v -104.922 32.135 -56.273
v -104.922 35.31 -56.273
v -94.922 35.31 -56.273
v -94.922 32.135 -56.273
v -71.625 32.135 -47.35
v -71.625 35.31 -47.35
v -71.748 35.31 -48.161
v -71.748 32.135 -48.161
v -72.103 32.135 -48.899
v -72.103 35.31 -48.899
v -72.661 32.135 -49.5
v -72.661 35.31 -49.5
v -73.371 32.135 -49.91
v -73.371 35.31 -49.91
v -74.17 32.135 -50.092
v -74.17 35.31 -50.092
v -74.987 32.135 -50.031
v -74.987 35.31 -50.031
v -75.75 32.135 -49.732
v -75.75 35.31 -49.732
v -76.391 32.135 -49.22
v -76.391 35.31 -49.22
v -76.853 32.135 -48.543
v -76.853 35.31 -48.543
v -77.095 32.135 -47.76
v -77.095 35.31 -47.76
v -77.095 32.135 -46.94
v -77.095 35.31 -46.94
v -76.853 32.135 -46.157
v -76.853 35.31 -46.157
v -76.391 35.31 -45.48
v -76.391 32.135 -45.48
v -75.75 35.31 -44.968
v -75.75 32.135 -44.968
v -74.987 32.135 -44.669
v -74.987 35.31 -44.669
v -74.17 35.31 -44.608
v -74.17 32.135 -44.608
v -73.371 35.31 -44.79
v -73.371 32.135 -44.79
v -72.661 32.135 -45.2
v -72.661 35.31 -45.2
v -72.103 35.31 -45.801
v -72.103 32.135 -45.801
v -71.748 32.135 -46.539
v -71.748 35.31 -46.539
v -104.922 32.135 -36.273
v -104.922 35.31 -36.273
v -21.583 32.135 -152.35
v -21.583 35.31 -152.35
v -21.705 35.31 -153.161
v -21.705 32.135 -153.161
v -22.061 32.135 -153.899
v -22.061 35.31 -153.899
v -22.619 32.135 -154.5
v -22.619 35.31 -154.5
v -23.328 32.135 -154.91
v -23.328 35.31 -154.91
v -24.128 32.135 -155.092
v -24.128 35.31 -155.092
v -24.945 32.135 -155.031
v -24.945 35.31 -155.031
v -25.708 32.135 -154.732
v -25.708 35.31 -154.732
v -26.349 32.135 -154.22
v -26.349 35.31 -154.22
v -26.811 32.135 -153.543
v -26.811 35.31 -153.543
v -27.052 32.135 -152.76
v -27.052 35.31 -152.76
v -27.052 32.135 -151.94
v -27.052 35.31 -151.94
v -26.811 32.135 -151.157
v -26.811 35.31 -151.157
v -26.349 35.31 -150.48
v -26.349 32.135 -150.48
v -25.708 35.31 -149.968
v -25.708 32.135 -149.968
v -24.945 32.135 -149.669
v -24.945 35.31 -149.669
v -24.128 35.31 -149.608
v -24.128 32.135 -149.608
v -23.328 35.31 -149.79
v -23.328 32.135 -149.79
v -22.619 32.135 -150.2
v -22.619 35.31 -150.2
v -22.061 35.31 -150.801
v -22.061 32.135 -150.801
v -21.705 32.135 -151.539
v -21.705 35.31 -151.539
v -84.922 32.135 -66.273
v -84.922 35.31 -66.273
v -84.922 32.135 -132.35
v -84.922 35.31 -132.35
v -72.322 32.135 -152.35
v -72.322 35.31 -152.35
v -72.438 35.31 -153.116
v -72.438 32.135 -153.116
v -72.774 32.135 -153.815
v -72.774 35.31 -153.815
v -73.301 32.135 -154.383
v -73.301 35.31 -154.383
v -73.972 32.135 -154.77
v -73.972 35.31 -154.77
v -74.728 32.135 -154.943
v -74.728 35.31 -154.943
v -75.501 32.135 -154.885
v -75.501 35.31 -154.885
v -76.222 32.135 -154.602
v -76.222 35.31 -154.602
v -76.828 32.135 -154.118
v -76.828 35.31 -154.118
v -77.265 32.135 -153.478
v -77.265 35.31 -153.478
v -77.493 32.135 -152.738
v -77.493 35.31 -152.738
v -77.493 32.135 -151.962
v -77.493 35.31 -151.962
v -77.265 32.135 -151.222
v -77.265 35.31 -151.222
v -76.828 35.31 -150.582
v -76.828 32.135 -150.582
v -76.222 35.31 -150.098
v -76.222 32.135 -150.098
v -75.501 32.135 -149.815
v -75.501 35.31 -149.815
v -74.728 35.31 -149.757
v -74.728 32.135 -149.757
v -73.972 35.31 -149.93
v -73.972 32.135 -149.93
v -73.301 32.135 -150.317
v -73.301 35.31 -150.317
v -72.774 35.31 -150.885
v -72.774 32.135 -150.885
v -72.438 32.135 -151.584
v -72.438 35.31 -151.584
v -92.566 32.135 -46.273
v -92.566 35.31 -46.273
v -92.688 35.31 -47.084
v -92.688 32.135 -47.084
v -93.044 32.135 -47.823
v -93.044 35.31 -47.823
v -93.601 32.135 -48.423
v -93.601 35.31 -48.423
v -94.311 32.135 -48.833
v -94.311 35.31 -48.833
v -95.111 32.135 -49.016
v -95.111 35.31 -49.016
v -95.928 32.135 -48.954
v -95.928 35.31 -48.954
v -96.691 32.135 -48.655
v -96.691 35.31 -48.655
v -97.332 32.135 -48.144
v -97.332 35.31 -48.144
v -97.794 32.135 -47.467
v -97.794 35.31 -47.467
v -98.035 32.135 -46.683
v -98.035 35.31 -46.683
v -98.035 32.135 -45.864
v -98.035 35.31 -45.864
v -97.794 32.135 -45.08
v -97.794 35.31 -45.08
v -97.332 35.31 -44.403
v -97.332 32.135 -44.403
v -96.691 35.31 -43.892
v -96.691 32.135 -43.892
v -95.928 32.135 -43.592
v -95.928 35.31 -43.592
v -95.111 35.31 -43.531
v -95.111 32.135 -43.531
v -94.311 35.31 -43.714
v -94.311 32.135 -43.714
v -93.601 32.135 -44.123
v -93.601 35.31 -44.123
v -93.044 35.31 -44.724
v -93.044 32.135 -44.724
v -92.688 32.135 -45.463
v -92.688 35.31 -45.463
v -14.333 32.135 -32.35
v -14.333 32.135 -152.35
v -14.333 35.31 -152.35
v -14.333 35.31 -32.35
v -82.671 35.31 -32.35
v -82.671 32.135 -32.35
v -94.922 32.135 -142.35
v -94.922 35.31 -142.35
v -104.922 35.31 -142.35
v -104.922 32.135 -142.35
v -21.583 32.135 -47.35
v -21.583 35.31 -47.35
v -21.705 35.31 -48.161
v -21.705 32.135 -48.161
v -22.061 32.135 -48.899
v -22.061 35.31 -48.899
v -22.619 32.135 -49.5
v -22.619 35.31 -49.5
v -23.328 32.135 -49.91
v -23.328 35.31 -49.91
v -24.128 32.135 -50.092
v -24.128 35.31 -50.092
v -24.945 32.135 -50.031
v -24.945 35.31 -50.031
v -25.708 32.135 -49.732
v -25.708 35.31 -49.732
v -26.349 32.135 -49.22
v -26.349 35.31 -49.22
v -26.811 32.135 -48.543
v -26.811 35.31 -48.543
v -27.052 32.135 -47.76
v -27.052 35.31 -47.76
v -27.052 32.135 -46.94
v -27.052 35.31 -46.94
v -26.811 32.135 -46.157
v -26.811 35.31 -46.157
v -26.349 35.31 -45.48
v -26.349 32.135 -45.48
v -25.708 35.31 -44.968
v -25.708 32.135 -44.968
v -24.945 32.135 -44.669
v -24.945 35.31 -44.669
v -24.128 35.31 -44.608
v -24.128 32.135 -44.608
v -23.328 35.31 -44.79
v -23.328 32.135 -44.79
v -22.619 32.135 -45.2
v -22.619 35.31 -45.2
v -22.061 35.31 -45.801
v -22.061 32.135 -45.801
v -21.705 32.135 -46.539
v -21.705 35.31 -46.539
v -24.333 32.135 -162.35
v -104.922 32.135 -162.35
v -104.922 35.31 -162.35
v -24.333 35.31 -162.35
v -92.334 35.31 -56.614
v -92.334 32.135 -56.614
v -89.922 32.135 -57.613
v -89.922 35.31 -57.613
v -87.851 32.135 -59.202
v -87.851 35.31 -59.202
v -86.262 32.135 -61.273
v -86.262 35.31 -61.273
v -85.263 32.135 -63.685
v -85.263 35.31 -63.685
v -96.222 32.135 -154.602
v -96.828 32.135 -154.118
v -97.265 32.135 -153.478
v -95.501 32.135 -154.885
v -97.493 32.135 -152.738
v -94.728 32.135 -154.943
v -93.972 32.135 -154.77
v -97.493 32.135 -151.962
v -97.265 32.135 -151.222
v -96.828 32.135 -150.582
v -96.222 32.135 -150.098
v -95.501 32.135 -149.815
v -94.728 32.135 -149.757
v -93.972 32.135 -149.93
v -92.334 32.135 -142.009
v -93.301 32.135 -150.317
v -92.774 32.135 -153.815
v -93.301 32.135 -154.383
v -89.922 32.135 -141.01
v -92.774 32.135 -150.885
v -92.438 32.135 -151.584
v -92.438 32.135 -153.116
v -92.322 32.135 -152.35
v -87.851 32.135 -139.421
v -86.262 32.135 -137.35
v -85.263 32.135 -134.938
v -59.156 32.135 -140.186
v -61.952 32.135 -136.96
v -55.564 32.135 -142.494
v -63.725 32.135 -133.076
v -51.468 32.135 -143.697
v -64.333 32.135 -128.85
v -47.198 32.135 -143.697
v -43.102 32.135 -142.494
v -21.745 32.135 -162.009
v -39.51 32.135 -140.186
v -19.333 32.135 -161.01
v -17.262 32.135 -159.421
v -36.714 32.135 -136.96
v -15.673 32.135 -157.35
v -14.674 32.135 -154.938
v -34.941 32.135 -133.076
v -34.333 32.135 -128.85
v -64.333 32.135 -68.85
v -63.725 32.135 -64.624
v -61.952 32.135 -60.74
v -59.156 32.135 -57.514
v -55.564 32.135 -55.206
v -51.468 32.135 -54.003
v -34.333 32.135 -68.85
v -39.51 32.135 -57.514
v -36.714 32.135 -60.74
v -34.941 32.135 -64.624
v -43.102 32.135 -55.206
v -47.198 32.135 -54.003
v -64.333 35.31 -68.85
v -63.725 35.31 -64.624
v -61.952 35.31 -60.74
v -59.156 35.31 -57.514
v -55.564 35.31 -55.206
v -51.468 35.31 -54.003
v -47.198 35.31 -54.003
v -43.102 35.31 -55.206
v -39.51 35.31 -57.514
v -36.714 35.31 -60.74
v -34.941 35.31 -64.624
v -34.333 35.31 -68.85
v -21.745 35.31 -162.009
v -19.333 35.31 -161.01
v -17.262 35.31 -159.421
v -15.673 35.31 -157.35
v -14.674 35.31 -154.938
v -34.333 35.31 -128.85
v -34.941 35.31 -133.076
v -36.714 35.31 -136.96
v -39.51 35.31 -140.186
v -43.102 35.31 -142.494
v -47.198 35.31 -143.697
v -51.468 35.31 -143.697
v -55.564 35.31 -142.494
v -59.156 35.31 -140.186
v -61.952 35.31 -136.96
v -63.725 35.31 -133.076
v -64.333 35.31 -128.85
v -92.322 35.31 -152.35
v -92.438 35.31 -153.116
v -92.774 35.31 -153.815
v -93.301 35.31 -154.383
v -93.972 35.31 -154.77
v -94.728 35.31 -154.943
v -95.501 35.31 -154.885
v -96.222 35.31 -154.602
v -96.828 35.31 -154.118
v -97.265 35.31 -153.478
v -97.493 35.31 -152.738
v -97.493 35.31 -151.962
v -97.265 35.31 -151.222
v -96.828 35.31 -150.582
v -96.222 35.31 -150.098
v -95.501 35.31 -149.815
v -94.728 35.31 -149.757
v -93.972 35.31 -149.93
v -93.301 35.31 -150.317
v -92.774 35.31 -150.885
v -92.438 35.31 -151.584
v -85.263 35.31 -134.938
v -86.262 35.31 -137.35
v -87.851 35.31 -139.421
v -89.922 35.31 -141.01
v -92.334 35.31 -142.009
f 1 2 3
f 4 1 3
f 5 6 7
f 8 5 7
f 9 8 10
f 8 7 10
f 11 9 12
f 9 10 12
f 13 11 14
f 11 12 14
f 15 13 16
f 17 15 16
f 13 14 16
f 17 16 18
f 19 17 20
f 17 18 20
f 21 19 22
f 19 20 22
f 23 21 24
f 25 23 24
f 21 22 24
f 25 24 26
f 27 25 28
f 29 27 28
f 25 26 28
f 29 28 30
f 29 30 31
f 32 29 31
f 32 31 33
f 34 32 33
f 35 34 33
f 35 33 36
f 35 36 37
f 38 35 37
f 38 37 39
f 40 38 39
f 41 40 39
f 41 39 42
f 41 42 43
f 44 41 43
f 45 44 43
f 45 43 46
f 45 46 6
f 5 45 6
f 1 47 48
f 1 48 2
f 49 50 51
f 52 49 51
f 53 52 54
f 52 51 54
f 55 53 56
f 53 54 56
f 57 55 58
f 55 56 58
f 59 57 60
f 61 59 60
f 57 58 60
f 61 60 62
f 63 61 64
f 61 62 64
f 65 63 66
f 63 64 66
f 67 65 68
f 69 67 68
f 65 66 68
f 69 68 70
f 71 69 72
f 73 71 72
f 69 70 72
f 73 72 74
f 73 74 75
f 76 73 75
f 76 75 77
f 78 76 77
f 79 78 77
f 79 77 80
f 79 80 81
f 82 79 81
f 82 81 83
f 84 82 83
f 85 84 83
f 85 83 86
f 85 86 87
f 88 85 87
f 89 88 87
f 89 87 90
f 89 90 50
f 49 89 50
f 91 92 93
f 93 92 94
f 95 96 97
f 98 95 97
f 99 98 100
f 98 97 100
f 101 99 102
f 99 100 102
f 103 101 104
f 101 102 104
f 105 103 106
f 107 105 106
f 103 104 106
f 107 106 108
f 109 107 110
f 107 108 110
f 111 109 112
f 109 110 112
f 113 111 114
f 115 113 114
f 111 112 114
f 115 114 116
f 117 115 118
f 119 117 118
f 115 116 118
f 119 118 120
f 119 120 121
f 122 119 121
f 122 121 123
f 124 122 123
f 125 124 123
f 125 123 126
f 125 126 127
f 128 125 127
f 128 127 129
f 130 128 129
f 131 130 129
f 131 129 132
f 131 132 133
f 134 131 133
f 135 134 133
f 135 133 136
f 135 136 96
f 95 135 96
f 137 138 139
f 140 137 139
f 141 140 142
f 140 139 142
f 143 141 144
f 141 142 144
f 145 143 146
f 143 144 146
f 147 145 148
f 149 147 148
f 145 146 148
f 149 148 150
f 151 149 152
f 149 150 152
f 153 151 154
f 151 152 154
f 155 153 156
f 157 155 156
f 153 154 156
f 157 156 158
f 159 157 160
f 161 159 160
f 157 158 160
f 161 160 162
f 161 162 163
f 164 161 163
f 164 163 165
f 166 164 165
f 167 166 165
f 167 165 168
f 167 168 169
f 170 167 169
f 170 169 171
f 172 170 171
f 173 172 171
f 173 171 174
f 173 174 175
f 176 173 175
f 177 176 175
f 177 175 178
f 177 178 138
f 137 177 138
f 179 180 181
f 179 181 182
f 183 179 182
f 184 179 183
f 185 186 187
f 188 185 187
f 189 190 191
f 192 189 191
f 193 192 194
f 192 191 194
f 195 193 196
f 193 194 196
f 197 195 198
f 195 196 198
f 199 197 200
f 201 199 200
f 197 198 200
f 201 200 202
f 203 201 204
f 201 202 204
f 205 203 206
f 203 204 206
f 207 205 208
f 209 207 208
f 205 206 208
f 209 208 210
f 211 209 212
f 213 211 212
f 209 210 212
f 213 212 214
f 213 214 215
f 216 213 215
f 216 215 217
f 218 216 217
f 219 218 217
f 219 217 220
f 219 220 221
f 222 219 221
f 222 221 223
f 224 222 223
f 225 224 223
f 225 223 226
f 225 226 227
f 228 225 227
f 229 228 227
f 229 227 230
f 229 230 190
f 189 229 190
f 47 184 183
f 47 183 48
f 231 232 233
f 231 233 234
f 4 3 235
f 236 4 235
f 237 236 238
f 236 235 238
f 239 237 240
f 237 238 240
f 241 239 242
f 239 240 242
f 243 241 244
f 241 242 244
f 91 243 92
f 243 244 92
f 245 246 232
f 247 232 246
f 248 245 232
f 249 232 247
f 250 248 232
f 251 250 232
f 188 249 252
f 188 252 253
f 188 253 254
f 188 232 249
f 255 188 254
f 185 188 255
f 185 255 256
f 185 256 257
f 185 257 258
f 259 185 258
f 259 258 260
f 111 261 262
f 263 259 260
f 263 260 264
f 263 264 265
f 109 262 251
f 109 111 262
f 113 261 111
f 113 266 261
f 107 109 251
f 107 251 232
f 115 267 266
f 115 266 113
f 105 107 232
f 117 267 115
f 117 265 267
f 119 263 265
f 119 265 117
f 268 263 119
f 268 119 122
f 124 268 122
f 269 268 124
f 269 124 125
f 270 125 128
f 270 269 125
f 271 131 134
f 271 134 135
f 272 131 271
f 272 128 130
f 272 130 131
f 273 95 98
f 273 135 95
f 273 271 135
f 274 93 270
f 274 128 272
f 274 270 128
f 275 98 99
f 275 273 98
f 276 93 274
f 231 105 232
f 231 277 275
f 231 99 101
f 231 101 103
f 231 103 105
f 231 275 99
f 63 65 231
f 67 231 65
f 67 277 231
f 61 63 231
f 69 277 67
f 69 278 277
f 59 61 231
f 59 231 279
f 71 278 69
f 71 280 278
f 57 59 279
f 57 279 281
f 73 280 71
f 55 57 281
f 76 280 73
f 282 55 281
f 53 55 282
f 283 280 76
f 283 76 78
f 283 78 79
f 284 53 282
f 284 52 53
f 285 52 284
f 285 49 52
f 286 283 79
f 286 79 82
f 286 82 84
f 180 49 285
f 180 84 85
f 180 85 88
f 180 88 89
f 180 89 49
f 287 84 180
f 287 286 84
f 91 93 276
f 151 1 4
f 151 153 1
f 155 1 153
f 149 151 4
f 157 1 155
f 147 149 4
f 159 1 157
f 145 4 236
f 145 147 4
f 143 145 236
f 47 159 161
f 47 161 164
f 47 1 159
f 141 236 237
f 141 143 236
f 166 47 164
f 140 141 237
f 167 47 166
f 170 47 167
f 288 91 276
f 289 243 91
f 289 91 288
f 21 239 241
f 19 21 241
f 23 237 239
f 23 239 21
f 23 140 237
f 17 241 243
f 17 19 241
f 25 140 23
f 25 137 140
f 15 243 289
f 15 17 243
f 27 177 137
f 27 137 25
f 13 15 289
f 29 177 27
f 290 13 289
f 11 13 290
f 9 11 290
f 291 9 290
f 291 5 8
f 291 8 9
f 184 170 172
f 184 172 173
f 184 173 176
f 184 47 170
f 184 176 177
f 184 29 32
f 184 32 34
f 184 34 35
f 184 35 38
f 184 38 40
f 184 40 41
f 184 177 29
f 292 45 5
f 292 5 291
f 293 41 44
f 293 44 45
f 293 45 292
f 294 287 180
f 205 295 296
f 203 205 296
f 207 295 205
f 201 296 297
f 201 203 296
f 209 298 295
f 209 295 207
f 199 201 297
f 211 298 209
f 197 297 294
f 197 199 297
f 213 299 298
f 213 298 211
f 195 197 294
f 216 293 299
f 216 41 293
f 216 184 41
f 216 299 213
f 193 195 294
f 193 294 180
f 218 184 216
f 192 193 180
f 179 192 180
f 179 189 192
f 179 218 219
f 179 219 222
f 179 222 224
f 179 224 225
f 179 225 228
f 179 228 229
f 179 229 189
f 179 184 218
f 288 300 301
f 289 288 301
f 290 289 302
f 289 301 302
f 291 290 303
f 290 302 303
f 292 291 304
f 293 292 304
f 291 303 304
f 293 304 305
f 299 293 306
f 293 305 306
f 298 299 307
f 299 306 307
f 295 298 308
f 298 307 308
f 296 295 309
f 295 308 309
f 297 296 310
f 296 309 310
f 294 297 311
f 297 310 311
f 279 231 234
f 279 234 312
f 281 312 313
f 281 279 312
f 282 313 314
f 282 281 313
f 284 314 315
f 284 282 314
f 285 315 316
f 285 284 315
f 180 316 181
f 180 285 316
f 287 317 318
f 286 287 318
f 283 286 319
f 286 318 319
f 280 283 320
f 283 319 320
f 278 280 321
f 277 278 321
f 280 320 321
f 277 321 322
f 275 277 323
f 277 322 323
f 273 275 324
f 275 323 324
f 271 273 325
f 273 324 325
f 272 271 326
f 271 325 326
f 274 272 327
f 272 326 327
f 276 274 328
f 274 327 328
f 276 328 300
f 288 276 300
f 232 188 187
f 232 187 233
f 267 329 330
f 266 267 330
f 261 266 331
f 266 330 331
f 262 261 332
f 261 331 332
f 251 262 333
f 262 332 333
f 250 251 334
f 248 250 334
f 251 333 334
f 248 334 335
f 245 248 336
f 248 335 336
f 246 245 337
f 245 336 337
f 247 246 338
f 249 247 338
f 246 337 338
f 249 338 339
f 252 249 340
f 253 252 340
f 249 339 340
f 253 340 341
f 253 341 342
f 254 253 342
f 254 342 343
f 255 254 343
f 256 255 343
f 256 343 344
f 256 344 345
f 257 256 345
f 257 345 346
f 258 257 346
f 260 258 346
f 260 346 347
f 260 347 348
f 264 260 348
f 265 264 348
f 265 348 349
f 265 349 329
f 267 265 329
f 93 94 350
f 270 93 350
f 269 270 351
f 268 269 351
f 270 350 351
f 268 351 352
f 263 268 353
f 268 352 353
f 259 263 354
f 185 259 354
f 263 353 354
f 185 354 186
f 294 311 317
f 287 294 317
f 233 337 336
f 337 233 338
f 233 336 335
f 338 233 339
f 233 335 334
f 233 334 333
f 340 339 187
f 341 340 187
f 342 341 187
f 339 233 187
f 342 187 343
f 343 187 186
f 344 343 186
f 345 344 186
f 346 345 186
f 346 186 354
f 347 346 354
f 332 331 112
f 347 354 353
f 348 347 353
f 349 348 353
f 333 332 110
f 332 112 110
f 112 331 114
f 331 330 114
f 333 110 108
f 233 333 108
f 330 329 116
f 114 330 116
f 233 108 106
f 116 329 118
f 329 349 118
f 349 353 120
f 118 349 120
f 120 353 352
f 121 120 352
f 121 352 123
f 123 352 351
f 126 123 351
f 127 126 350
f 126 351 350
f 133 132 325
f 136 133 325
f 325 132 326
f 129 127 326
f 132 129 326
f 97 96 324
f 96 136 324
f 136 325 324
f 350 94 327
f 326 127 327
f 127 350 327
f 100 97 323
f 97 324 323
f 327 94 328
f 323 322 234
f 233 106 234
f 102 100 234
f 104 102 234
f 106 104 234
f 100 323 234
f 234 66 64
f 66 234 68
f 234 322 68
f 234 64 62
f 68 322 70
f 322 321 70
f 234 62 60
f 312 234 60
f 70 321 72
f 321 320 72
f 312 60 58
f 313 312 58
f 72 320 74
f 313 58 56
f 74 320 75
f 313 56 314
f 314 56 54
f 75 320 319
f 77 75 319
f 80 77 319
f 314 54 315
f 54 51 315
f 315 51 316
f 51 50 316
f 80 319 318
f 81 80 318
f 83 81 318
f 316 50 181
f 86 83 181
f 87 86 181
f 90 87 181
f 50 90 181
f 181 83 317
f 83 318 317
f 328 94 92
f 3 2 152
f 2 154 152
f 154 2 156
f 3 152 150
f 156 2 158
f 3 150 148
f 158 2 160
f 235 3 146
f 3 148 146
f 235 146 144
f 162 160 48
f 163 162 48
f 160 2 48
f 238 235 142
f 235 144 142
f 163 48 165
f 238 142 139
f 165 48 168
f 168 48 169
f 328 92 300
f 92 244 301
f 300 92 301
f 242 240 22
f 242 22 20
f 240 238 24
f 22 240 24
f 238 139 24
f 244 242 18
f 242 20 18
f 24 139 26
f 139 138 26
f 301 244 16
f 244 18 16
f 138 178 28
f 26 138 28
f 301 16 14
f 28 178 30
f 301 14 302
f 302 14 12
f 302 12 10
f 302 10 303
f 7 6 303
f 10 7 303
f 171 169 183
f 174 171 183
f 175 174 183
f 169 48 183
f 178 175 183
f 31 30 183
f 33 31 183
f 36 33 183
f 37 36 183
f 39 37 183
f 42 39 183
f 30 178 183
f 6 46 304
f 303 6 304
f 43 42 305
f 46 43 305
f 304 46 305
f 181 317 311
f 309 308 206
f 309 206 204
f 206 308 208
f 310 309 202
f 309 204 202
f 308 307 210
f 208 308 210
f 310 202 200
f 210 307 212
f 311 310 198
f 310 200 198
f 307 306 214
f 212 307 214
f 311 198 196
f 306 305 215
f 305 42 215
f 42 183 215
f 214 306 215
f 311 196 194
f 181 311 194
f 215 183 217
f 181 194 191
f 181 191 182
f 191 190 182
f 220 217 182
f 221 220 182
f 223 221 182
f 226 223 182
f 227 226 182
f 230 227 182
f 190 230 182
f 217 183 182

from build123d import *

# Parameters (mm, degrees)
BASE_FLANGE1_DEPTH         = 3.175
CUT_EXTRUDE1_DEPTH         = 194.329458355
CUT_EXTRUDE2_DEPTH         = 194.329458355
F_5_2_5_2_DIAMETER_HOLE1_D = 5.2
F_5_5_5_5_DIAMETER_HOLE1_D = 5.5


# Sheet-metal steps are written as plain solids
with BuildPart() as part:
    # Sketch11 → Base-Flange1 (new body)
    with BuildSketch(Plane.XZ.offset(-32.134736729)):
        with BuildLine():
            Line((-82.671285527, -32.35), (-104.922239506, -36.273443533))
            Line((-104.922239506, -36.273443533), (-104.922239506, -162.35))
            Line((-104.922239506, -162.35), (-24.333100178, -162.35))
            ThreePointArc((-24.333100178, -162.35), (-17.262032366, -159.421067812), (-14.333100178, -152.35))
            Line((-14.333100178, -152.35), (-14.333100178, -32.35))
            Line((-14.333100178, -32.35), (-82.671285527, -32.35))
        make_face()
    extrude(amount=-BASE_FLANGE1_DEPTH)

    # Sketch16 → Cut-Extrude1 (cut, through all)
    with BuildSketch(Plane(origin=(0, 35.309736729, 0), x_dir=(-1, 0, 0), z_dir=(0, 1, 0))):
        with BuildLine():
            Line((104.922239506, -142.35), (104.922239506, -56.273443533))
            Line((104.922239506, -56.273443533), (94.922239506, -56.273443533))
            ThreePointArc((94.922239506, -56.273443533), (87.851171694, -59.202375721), (84.922239506, -66.273443533))
            Line((84.922239506, -66.273443533), (84.922239506, -132.35))
            ThreePointArc((84.922239506, -132.35), (87.851171694, -139.421067812), (94.922239506, -142.35))
            Line((94.922239506, -142.35), (104.922239506, -142.35))
        make_face()
    extrude(amount=-CUT_EXTRUDE1_DEPTH, mode=Mode.SUBTRACT)

    # Sketch17 → Cut-Extrude2 (cut, through all)
    with BuildSketch(Plane(origin=(0, 35.309736729, 0), x_dir=(-1, 0, 0), z_dir=(0, 1, 0))):
        with BuildLine():
            Line((64.333100178, -128.85), (64.333100178, -68.85))
            ThreePointArc((64.333100178, -68.85), (49.333100178, -53.85), (34.333100178, -68.85))
            Line((34.333100178, -68.85), (34.333100178, -128.85))
            ThreePointArc((34.333100178, -128.85), (49.333100178, -143.85), (64.333100178, -128.85))
        make_face()
    extrude(amount=-CUT_EXTRUDE2_DEPTH, mode=Mode.SUBTRACT)

    # Ø5.2 (5.2) Diameter Hole1 (through all)
    with Locations(Plane(origin=(0, 32.134736729, 0), x_dir=(-1, 0, 0), z_dir=(0, -1, 0))):
        with Locations((94.922239506, 152.35), (74.922239506, 152.35)):
            Hole(F_5_2_5_2_DIAMETER_HOLE1_D / 2)

    # Ø5.5 (5.5) Diameter Hole1 (through all)
    with Locations(Plane(origin=(0, 32.134736729, 0), x_dir=(-1, 0, 0), z_dir=(0, -1, 0))):
        with Locations((95.316058397, 46.273443533), (74.375466886, 47.35), (24.333100178, 47.35), (24.333100178, 152.35)):
            Hole(F_5_5_5_5_DIAMETER_HOLE1_D / 2)


solid = part.part
